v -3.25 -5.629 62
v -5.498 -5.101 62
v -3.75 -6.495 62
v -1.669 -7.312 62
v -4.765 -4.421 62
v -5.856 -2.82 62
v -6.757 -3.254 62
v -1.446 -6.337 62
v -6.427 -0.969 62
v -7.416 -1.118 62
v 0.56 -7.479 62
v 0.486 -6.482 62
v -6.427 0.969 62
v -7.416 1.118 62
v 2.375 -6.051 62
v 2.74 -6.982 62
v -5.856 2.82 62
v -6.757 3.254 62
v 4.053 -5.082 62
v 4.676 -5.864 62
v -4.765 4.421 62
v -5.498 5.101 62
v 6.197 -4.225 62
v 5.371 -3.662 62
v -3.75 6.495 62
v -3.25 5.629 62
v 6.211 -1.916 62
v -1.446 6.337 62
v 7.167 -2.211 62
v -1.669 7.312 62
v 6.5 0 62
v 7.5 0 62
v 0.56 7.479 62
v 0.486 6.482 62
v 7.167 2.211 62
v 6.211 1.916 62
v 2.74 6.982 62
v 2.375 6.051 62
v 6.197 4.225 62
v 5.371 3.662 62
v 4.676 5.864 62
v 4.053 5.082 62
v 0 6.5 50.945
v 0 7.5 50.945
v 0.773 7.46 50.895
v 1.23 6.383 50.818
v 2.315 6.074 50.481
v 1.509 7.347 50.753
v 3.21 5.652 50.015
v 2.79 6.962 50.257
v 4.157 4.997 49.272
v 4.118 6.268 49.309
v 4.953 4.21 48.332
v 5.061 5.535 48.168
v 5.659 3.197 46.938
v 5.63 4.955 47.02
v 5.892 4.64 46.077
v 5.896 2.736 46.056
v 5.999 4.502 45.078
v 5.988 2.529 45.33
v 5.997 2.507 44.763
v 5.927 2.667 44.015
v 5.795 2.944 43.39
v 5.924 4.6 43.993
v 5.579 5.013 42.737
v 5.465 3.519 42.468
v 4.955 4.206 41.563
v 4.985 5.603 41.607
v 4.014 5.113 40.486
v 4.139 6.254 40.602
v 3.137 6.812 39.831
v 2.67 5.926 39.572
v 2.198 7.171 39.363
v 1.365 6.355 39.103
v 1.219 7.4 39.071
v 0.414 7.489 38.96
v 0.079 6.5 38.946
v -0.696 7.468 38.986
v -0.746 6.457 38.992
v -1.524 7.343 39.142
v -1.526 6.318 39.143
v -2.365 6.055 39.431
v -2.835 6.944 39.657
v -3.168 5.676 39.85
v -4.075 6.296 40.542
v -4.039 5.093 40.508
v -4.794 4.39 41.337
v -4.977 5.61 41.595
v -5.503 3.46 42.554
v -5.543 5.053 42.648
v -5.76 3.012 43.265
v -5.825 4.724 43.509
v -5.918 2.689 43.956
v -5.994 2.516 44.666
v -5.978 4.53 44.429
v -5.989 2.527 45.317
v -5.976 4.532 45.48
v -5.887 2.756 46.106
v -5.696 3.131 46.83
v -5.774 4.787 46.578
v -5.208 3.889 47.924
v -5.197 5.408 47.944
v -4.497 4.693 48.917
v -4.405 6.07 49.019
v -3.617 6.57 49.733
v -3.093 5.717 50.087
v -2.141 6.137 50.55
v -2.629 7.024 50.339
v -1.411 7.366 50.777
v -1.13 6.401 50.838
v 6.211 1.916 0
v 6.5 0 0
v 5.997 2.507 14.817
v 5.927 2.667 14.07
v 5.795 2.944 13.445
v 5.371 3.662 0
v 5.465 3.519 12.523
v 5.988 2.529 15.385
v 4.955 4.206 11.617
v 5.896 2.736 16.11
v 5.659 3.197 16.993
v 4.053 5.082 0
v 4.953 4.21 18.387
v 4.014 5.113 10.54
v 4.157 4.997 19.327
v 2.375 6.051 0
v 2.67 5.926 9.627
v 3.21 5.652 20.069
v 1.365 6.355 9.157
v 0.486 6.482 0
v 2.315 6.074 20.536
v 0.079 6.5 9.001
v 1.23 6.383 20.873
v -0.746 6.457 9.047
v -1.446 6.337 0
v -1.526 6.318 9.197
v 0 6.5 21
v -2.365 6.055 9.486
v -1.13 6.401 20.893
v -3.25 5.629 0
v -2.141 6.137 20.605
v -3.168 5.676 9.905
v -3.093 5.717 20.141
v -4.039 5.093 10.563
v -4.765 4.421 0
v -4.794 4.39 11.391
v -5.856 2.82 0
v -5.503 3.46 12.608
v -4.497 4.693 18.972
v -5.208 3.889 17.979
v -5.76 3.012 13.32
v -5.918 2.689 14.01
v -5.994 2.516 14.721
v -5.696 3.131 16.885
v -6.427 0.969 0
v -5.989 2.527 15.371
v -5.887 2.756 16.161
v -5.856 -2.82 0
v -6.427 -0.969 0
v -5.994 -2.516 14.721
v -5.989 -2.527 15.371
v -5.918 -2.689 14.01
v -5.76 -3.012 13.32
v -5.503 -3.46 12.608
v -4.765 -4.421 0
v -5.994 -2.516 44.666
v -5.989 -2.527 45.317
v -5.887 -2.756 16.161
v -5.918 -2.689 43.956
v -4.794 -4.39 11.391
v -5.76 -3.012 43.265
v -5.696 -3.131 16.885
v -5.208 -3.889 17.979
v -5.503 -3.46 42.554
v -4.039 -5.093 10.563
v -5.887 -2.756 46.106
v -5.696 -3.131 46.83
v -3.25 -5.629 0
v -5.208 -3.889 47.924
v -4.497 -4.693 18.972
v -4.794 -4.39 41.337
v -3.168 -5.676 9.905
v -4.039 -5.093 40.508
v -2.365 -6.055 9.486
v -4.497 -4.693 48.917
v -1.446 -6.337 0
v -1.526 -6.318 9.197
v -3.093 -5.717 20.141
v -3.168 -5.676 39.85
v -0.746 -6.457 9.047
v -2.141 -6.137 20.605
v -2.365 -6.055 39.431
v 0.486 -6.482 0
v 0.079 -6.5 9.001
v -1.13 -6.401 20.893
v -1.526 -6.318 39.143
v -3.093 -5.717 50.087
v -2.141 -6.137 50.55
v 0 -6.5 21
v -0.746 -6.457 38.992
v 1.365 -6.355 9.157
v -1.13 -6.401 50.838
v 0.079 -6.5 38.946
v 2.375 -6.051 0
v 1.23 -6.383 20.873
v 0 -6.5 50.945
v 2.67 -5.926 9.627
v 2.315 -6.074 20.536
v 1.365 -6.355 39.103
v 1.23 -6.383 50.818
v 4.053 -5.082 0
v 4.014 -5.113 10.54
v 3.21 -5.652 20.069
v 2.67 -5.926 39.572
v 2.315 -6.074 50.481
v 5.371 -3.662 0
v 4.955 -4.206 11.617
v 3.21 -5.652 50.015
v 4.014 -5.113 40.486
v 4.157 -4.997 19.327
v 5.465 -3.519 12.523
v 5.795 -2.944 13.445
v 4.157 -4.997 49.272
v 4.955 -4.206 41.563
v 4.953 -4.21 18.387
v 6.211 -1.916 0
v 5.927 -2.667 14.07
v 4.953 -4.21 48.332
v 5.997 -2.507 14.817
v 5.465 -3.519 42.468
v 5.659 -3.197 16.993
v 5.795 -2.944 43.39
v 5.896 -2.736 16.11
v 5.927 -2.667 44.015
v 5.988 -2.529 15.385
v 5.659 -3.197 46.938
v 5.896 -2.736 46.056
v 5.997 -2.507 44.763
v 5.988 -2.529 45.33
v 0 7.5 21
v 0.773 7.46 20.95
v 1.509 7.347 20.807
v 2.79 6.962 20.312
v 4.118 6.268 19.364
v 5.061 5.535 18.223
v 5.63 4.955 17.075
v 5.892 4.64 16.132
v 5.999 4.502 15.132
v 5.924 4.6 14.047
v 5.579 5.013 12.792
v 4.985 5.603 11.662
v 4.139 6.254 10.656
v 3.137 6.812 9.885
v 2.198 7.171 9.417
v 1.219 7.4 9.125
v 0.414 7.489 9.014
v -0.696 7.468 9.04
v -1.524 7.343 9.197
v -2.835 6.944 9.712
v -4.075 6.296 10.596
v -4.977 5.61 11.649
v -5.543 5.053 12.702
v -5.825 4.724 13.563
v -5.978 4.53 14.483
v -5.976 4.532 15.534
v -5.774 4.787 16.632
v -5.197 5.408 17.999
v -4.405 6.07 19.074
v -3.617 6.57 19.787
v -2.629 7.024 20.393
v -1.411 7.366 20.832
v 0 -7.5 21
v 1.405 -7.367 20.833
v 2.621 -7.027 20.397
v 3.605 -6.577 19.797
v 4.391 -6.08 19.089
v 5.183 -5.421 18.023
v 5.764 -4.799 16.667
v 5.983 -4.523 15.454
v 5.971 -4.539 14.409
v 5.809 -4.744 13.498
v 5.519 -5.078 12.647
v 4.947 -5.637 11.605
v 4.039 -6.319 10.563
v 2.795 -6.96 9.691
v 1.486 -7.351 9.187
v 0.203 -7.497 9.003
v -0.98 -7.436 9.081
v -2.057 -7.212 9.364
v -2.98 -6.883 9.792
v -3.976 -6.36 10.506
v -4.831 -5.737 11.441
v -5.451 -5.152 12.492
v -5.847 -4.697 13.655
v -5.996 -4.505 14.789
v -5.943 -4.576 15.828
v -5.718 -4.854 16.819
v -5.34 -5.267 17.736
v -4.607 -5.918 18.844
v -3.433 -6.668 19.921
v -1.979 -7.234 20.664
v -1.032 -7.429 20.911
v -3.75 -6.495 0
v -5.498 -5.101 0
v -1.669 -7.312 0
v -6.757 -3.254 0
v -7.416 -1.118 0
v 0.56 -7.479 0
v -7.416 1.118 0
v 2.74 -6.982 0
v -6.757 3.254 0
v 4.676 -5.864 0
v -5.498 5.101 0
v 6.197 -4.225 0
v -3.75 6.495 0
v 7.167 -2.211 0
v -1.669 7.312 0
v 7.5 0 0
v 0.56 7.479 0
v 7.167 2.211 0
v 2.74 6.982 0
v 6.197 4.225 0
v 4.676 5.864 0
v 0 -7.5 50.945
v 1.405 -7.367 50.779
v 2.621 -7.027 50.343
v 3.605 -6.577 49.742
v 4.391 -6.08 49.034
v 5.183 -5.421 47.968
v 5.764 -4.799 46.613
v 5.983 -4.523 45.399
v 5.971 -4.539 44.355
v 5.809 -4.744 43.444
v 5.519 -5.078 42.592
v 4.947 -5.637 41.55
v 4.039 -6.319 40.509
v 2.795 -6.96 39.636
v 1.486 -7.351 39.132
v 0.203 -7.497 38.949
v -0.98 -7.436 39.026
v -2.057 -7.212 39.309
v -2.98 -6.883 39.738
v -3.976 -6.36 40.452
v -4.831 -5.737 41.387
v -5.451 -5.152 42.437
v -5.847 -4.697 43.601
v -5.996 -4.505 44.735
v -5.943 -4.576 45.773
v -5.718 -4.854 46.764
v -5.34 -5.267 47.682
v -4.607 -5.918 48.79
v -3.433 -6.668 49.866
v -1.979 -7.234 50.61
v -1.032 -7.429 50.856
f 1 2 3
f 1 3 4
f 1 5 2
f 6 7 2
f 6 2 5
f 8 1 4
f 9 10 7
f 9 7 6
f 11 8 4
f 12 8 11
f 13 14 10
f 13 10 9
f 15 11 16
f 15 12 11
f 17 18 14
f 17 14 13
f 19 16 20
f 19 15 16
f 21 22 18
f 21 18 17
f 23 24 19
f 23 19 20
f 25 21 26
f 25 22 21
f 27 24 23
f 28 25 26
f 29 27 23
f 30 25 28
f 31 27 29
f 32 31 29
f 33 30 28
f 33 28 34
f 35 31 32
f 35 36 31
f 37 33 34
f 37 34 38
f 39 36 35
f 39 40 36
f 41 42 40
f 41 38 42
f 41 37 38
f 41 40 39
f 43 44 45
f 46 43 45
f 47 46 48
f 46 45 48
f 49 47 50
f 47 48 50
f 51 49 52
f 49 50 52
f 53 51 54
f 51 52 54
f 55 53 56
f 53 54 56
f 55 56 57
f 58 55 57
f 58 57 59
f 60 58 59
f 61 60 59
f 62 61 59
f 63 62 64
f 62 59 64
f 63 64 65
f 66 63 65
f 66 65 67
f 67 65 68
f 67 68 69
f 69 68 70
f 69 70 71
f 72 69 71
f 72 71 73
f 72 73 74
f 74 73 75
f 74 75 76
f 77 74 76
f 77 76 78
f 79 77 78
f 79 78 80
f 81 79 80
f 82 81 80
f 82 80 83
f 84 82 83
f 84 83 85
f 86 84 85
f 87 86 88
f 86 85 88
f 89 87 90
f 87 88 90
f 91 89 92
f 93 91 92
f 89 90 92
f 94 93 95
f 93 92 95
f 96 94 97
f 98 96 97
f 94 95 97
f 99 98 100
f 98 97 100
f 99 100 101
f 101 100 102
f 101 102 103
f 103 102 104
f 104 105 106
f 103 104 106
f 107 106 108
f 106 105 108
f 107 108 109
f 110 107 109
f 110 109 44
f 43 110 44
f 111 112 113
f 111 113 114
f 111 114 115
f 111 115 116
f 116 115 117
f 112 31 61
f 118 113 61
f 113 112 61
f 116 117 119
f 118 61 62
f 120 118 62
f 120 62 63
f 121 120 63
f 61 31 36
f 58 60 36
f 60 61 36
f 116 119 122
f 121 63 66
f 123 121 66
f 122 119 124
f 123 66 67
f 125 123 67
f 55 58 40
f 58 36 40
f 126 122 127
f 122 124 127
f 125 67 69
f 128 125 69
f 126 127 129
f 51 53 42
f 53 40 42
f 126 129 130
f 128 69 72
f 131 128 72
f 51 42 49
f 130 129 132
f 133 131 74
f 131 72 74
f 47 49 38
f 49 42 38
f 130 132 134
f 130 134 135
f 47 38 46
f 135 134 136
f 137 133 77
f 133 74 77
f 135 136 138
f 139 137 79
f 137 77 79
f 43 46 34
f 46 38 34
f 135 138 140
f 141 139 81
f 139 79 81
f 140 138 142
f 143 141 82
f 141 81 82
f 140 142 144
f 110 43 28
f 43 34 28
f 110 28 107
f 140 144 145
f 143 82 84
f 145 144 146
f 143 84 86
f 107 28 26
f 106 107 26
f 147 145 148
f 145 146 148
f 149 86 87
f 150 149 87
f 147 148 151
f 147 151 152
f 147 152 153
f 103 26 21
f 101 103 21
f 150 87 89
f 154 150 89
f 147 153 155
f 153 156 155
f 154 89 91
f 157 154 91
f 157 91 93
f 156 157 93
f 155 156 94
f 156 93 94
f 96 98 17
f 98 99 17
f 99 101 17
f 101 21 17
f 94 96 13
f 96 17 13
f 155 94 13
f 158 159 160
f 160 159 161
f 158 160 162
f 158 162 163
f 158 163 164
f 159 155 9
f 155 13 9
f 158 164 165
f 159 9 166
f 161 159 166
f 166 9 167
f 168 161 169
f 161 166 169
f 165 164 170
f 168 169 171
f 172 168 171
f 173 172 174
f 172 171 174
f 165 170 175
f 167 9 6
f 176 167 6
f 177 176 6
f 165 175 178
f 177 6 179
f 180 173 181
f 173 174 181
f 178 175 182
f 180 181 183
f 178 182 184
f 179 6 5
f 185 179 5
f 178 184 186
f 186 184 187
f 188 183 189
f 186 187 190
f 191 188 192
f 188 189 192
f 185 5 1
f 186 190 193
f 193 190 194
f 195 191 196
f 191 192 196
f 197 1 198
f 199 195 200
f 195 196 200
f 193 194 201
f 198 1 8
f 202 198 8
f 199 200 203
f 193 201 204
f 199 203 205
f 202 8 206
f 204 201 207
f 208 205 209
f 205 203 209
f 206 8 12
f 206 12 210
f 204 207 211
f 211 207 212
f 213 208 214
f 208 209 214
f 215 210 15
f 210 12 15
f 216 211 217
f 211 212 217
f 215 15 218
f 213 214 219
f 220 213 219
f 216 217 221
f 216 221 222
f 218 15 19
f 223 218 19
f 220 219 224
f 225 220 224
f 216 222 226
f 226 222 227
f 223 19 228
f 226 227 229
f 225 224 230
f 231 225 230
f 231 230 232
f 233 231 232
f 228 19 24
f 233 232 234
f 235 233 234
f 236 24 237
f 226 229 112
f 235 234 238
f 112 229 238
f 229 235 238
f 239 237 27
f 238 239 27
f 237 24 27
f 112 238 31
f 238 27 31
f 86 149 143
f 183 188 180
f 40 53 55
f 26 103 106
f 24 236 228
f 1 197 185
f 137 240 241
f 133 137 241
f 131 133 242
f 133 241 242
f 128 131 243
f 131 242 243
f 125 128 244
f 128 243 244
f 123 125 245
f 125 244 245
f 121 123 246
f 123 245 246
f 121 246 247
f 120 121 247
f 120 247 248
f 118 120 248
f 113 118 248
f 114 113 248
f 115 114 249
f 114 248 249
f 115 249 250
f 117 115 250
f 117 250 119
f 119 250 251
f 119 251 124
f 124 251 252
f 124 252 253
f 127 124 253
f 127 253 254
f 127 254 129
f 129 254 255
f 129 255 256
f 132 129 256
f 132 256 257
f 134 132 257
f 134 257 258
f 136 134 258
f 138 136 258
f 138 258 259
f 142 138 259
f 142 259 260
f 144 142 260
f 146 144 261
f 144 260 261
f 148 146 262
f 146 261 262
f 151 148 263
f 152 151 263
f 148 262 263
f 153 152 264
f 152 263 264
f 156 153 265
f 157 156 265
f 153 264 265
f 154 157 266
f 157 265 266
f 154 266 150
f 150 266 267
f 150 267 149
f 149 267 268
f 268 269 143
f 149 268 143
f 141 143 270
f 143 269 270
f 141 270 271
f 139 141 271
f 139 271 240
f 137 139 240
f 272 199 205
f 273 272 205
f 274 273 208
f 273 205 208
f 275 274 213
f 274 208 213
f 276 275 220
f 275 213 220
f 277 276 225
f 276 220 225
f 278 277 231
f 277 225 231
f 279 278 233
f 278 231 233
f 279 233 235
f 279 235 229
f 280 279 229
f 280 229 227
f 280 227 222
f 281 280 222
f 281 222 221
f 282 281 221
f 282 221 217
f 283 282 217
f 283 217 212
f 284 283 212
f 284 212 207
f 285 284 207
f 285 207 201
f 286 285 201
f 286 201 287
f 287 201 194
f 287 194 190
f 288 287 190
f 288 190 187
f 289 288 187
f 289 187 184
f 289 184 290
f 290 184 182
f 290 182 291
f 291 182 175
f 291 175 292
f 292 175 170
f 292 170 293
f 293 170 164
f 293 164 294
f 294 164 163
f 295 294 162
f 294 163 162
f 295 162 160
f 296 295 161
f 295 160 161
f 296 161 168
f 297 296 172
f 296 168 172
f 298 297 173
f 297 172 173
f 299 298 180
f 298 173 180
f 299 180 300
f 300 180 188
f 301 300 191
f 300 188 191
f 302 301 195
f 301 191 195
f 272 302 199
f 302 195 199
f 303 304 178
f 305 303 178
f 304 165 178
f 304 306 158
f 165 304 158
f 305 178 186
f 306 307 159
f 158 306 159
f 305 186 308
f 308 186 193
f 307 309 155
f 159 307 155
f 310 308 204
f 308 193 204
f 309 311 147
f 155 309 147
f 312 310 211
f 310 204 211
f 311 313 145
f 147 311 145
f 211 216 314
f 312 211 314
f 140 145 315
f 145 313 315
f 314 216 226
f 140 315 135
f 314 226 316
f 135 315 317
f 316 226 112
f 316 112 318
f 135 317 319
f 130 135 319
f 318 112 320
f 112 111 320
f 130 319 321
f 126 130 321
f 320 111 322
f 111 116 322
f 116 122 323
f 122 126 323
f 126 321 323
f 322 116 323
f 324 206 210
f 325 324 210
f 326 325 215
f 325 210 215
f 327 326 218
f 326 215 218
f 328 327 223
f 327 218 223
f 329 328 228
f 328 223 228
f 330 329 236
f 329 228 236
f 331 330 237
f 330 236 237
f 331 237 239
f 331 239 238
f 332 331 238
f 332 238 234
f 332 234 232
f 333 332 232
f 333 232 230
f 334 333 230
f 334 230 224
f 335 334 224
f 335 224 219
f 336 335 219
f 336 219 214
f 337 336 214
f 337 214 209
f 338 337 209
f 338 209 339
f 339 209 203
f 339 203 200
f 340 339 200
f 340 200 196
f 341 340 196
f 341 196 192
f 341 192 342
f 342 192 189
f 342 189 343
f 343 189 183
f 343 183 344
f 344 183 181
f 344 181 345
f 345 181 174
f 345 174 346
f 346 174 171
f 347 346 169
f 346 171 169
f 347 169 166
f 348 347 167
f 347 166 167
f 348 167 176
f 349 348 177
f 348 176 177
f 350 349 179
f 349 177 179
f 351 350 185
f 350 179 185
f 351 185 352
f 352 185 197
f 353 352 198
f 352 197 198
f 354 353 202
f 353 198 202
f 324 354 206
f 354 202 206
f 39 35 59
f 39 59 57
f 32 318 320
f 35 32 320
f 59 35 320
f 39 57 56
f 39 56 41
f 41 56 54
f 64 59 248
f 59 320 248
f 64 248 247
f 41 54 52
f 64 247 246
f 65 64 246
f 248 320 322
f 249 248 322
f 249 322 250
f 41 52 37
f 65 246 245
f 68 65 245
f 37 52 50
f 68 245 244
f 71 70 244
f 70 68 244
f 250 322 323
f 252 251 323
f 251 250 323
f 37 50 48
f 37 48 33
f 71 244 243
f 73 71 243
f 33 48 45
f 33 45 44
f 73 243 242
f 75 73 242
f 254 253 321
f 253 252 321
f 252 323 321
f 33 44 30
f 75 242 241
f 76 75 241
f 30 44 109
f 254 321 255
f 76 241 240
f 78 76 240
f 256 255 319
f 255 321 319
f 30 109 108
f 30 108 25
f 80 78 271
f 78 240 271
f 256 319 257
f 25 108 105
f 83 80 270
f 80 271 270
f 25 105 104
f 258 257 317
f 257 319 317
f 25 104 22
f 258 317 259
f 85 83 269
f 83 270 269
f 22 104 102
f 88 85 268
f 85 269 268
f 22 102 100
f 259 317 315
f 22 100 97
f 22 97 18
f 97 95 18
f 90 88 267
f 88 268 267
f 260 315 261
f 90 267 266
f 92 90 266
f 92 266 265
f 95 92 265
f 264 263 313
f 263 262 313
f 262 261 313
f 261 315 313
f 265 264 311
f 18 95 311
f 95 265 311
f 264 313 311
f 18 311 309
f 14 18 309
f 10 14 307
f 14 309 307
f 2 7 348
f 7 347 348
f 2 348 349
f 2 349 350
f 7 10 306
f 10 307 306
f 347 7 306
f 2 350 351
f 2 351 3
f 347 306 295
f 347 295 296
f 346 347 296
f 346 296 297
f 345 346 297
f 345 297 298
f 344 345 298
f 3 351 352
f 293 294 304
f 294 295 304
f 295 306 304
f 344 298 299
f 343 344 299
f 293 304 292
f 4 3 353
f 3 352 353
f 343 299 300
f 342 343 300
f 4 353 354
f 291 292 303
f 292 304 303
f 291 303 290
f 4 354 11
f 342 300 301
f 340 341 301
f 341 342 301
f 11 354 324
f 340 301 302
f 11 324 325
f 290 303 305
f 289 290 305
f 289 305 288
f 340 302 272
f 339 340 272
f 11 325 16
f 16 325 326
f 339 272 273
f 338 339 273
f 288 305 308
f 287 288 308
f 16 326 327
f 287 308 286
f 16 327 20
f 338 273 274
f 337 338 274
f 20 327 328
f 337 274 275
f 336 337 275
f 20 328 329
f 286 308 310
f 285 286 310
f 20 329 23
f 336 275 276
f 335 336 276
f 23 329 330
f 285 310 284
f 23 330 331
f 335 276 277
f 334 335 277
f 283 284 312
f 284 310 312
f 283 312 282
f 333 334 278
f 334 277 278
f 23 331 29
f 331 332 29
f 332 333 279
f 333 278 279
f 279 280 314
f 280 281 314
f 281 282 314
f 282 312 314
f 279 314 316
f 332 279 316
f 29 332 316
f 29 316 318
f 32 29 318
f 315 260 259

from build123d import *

# Parameters (mm, degrees)
SKETCH1_R           = 7.5
BOSS_EXTRUDE1_DEPTH = 62
SKETCH2_R           = 6.5
CUT_EXTRUDE1_DEPTH  = 63.900715417
SKETCH3_R           = 6
CUT_EXTRUDE2_DEPTH  = 65.228109111


with BuildPart() as part:
    # Sketch1 → Boss-Extrude1 (new body)
    with BuildSketch(Plane.XY):
        Circle(SKETCH1_R)
    extrude(amount=BOSS_EXTRUDE1_DEPTH)

    # Sketch2 → Cut-Extrude1 (cut, through all)
    with BuildSketch(Plane.XY.offset(62)):
        Circle(SKETCH2_R)
    extrude(amount=-CUT_EXTRUDE1_DEPTH, mode=Mode.SUBTRACT)

    # Sketch3 → Cut-Extrude2 (cut, through all)
    with BuildSketch(Plane(origin=(0, 7.5, 0), x_dir=(1, 0, 0), z_dir=(0, 1, 0))):
        with Locations(Location((0, -15, 0), (0, 0, 270))):
            Circle(SKETCH3_R)
        with Locations(Location((0, -44.945445828, 0), (0, 0, 270))):
            Circle(SKETCH3_R)
    extrude(amount=-CUT_EXTRUDE2_DEPTH, mode=Mode.SUBTRACT)


solid = part.part
